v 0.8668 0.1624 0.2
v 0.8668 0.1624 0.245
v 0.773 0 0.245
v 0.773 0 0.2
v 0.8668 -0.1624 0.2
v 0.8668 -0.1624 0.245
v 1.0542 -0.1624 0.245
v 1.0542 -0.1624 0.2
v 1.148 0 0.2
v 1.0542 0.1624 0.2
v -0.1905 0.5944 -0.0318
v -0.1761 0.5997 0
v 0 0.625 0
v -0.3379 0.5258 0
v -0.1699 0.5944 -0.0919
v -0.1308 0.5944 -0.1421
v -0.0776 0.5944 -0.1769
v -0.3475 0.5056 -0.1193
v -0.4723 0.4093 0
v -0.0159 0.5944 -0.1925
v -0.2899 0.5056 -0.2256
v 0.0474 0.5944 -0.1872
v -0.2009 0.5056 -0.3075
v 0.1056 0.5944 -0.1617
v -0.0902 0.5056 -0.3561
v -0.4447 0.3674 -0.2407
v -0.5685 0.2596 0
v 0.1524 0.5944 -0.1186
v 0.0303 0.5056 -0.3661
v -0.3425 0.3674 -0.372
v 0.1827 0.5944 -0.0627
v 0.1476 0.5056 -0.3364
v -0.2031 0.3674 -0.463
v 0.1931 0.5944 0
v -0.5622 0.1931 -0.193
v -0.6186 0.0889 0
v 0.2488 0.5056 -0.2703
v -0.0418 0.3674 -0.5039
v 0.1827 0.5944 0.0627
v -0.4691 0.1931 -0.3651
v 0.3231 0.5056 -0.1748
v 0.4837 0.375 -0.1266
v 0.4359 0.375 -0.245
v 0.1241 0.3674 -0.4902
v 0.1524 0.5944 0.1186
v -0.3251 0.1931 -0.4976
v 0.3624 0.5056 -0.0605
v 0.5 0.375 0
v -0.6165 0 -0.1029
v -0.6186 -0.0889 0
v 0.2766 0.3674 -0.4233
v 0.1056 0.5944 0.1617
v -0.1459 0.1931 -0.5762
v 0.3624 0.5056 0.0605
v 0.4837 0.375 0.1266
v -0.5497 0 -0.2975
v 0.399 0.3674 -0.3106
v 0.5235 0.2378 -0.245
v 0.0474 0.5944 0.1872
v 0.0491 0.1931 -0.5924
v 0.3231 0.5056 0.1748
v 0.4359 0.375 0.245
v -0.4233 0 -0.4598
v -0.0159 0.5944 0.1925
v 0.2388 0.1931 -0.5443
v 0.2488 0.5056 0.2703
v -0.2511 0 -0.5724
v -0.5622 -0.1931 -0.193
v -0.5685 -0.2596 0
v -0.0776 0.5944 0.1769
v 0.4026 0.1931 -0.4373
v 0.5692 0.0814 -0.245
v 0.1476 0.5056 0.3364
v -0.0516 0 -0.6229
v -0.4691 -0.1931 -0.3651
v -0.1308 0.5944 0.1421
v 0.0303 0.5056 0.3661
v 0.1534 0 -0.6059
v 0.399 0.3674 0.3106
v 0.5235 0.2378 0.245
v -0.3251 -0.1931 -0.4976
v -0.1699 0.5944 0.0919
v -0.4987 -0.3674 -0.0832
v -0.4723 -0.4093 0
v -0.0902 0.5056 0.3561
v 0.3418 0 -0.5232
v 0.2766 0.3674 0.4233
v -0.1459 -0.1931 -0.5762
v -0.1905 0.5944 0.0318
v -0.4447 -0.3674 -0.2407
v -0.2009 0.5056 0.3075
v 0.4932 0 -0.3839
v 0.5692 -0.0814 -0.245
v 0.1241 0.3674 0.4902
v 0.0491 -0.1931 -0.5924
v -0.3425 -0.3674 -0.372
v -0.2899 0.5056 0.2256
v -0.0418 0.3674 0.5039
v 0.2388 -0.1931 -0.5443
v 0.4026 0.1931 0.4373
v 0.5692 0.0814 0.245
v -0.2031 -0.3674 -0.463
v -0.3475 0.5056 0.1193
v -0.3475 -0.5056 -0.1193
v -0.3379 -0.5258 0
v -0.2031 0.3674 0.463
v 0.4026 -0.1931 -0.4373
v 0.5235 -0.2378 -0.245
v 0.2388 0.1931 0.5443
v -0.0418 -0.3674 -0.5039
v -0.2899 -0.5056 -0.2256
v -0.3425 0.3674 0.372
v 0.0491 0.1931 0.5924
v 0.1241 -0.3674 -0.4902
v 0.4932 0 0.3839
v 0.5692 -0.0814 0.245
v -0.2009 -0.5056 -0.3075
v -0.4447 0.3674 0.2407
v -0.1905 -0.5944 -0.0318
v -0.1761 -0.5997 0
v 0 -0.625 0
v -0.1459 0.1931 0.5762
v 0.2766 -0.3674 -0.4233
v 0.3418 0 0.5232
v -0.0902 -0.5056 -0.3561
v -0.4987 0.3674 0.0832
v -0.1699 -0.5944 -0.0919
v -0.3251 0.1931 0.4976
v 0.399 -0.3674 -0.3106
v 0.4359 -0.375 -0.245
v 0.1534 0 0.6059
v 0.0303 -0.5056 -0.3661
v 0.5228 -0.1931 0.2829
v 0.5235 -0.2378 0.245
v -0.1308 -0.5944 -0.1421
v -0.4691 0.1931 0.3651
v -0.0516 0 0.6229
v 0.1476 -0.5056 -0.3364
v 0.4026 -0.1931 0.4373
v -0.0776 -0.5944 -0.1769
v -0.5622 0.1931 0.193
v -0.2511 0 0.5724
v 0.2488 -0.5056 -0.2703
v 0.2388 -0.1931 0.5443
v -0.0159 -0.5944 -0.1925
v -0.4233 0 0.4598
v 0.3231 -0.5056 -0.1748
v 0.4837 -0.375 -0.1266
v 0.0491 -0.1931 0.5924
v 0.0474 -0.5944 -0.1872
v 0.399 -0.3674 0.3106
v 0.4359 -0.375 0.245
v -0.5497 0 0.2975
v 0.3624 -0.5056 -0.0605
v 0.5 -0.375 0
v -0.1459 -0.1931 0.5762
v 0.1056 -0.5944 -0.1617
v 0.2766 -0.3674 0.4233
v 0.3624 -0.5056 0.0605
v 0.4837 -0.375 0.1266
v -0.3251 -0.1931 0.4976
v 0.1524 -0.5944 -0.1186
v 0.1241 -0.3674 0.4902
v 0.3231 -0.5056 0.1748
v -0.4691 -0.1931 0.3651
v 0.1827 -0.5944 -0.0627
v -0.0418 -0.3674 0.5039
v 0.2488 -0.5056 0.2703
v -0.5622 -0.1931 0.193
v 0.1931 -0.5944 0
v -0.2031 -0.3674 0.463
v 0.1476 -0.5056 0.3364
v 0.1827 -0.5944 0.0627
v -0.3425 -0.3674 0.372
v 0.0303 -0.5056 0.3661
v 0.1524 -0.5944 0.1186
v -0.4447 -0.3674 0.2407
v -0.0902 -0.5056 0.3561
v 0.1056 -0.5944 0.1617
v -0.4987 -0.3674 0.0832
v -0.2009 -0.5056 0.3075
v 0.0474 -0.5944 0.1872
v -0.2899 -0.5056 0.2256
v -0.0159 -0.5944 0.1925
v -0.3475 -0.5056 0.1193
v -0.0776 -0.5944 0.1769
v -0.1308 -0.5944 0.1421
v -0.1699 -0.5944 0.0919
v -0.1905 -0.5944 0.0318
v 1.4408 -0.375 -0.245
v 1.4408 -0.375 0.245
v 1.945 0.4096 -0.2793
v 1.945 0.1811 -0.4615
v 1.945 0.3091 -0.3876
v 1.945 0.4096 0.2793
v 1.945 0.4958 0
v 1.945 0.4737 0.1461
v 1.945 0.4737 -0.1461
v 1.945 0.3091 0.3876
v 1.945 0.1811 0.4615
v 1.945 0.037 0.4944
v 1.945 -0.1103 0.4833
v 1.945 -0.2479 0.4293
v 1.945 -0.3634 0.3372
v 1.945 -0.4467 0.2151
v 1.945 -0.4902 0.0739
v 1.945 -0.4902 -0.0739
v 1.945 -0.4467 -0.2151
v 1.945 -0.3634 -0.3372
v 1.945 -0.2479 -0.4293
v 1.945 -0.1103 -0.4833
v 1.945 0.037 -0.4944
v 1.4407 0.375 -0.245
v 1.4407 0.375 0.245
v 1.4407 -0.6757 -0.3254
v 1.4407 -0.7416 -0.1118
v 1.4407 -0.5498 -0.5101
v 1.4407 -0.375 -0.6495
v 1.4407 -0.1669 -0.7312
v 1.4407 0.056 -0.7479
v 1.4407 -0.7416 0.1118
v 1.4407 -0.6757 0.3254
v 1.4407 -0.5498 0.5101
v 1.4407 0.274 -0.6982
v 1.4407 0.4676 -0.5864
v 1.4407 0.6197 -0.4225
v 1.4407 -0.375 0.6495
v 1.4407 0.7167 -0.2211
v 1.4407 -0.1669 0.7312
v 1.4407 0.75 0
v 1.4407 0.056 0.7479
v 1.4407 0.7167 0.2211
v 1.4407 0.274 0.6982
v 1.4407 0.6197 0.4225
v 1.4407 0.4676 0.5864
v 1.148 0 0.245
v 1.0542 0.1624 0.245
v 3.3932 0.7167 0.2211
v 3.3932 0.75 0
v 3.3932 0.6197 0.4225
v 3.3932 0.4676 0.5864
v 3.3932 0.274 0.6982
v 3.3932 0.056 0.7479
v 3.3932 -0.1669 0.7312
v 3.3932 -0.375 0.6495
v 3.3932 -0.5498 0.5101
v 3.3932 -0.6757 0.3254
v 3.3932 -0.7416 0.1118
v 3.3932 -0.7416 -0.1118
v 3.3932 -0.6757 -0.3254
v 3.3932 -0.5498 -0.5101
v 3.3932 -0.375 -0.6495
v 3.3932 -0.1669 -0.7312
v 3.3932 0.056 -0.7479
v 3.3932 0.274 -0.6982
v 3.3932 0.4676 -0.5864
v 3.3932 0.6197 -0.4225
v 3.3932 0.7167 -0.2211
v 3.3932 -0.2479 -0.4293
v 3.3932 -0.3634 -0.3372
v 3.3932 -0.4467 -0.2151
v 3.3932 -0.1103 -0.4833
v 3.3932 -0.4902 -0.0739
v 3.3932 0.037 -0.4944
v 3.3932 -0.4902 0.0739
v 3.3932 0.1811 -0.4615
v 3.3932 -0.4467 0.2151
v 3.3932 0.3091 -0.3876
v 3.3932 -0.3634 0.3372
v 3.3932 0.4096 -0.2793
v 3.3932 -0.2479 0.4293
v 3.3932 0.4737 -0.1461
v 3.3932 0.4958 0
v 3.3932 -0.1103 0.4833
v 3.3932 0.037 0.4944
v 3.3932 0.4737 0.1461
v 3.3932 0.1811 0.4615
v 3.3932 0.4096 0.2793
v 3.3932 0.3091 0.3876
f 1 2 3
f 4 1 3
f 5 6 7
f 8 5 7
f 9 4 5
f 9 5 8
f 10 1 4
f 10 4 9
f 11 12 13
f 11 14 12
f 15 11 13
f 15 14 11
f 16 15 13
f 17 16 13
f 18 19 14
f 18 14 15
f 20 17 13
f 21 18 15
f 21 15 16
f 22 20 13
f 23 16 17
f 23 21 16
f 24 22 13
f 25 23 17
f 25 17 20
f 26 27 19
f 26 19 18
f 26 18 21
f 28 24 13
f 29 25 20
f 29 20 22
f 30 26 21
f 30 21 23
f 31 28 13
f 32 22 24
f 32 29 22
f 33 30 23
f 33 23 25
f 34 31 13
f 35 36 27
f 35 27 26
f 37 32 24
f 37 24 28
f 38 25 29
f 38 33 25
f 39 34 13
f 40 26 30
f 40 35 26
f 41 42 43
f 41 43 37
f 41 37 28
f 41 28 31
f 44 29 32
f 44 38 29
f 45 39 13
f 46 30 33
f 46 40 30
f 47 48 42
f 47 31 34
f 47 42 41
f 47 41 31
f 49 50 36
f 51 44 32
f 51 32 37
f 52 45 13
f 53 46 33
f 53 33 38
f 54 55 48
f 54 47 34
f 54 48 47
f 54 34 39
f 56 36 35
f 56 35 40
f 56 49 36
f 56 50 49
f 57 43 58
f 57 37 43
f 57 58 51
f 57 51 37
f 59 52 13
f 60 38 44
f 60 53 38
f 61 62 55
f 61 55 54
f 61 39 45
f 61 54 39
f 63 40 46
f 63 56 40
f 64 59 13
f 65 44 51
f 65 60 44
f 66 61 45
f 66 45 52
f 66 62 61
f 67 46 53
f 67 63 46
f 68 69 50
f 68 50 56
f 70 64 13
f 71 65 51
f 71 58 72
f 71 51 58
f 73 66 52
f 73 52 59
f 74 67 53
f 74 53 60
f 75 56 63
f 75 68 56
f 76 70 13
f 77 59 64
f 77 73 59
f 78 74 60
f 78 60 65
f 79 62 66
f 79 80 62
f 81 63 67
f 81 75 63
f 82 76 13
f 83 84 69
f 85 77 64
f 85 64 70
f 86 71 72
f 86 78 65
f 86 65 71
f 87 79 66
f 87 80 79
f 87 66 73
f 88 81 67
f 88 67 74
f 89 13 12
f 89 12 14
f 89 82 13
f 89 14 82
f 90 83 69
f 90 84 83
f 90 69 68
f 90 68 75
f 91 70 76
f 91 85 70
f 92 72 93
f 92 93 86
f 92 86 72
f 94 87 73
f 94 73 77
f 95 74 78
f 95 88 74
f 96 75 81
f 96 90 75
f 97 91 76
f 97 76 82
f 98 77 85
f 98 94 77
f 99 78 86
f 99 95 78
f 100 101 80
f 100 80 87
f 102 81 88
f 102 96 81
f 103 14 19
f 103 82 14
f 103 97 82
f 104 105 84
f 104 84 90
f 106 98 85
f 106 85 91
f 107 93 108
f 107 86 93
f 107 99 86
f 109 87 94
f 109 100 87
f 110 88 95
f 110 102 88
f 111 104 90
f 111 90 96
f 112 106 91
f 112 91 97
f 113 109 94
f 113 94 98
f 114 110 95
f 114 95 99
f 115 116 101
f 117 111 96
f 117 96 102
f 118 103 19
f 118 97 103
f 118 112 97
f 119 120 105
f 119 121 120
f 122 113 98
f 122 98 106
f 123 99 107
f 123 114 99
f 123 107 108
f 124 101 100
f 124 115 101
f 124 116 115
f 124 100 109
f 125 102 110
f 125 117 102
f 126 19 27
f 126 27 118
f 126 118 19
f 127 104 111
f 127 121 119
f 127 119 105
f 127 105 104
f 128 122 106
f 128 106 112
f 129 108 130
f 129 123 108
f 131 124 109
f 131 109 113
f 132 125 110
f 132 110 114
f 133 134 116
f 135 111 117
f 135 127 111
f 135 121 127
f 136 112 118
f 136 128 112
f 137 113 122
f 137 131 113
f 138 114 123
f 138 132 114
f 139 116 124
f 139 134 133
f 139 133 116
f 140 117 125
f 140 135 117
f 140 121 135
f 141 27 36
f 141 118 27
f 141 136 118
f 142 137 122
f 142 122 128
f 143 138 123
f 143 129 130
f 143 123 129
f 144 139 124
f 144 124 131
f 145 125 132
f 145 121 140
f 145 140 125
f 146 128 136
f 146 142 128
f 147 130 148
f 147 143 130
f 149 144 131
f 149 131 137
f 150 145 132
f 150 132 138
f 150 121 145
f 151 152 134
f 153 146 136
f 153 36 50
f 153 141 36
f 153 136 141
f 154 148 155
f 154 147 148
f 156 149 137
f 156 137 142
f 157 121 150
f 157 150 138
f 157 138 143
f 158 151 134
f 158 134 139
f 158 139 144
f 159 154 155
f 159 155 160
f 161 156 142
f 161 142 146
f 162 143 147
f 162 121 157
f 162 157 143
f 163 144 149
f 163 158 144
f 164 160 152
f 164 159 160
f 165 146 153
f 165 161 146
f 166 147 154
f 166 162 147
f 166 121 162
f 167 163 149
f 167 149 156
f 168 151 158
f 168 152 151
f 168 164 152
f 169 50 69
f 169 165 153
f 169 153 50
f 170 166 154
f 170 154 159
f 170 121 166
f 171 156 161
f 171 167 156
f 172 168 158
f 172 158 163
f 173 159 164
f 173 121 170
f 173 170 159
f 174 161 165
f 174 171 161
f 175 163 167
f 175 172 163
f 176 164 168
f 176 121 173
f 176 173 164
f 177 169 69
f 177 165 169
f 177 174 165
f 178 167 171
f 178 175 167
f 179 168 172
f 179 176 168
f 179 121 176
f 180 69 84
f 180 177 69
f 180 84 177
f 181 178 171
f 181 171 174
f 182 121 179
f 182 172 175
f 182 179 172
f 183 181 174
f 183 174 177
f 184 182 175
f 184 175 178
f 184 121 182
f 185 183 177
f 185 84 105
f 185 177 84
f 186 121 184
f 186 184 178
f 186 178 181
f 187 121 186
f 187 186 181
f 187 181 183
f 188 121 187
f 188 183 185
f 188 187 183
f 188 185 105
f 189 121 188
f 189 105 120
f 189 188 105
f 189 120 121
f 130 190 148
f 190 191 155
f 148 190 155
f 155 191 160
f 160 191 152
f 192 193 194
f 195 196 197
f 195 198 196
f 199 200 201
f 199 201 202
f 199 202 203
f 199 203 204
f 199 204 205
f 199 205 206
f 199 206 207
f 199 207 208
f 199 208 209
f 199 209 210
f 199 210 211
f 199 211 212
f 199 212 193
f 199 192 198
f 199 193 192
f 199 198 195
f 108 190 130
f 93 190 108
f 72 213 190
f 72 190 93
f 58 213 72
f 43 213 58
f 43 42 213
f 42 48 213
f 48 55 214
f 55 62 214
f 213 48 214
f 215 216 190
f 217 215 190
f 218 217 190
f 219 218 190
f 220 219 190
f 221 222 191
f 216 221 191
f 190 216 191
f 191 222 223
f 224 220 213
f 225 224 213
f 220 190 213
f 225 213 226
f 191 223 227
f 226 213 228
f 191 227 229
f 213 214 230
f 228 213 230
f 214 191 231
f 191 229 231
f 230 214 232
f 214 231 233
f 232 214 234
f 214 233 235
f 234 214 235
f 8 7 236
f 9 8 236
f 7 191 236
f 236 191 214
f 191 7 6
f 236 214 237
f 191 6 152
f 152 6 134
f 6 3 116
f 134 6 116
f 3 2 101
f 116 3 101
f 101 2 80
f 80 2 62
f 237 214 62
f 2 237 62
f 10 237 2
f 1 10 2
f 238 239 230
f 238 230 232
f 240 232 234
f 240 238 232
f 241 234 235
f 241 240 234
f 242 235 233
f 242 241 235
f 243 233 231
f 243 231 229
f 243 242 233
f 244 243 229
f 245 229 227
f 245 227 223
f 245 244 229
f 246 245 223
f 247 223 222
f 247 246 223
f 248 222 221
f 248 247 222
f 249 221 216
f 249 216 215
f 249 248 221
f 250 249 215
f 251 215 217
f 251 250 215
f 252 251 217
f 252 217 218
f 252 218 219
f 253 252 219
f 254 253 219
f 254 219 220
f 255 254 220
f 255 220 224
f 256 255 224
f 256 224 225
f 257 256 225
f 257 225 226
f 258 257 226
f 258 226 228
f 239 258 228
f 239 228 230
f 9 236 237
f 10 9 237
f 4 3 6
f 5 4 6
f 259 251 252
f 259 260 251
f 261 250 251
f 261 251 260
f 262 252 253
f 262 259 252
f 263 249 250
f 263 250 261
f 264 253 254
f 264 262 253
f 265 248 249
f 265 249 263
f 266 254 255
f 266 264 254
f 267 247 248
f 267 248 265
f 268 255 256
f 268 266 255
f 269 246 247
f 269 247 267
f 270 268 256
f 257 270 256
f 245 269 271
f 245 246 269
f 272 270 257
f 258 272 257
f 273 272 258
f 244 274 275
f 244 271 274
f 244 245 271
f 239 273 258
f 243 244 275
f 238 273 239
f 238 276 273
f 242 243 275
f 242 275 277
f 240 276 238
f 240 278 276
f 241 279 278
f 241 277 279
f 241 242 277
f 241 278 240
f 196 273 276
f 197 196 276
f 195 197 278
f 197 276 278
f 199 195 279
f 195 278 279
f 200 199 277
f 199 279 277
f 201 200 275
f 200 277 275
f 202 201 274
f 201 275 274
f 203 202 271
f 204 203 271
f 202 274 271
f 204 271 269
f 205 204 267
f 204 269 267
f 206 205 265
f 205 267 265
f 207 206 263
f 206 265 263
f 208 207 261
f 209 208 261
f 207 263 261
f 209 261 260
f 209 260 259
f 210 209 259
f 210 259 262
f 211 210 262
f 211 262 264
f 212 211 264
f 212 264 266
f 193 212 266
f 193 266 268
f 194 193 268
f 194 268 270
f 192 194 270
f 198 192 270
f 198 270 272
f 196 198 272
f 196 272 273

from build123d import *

# Parameters (mm, degrees)
PAD_DEPTH       = 0.245
POCKET_DEPTH    = 0.05
SKETCH004_R     = 0.75
PAD001_DEPTH    = 10.08525
SKETCH005_R     = 3
HOLE_DEPTH      = 26
SKETCH006_R     = 0.495763
POCKET001_DEPTH = 9.580987
SKETCH007_W     = 15
SKETCH007_H     = 15
POCKET002_DEPTH = 8.1338


with BuildPart() as part:
    # Sketch → Pad (new body, symmetric)
    with BuildSketch(Plane.XY):
        with BuildLine():
            Line((0, 0.375), (19.21, 0.375))
            ThreePointArc((19.21, -0.375), (19.585, 0), (19.21, 0.375))
            Line((19.21, -0.375), (0, -0.375))
            ThreePointArc((0, 0.375), (-0.375, 0), (0, -0.375))
        make_face()
    extrude(amount=PAD_DEPTH, both=True)

    # Sketch001 → Revolution (revolve)
    with BuildSketch(Plane.XY):
        with BuildLine():
            Line((0, 0.625), (0, 0))
            Line((0, 0), (0, -0.625))
            ThreePointArc((0, 0.625), (-0.625, 0), (0, -0.625))
        make_face()
    revolve(axis=Axis((0, 0, 0), (0, -1, 0)))

    # Sketch002 → Revolution001 (revolve)
    with BuildSketch(Plane.XY):
        with BuildLine():
            ThreePointArc((19.21, -0.625), (19.835, 0), (19.21, 0.625))
            Line((19.21, 0.625), (19.21, 0))
            Line((19.21, 0), (19.21, -0.625))
        make_face()
    revolve(axis=Axis((19.21, 0, 0), (0, -1, 0)))

    # Sketch003 (on DatumPlane) → Pocket (cut)
    with BuildSketch(Plane.XY.offset(0.25)):
        Polygon((1.05425, -0.16238), (1.148, 0), (1.05425, 0.16238), (0.86675, 0.16238), (0.773, 0), (0.86675, -0.16238), align=None)
    extrude(amount=-POCKET_DEPTH, mode=Mode.SUBTRACT)

    # Sketch004 (on DatumPlane) → Pad001 (join)
    with BuildSketch(Plane.YZ.offset(11.526)):
        Circle(SKETCH004_R)
    extrude(amount=-PAD001_DEPTH)

    # Sketch005 (on DatumPlane) → Hole (cut)
    with BuildSketch(Plane.YZ.offset(11.526)):
        Circle(SKETCH005_R)
    extrude(amount=HOLE_DEPTH, mode=Mode.SUBTRACT)

    # Sketch006 (on DatumPlane) → Pocket001 (cut)
    with BuildSketch(Plane.YZ.offset(11.526)):
        Circle(SKETCH006_R)
    extrude(amount=-POCKET001_DEPTH, mode=Mode.SUBTRACT)

    # Sketch007 (on DatumPlane) → Pocket002 (cut, through all)
    with BuildSketch(Plane.YZ.offset(3.3932)):
        Rectangle(SKETCH007_W, SKETCH007_H)
    extrude(amount=POCKET002_DEPTH, mode=Mode.SUBTRACT)


solid = part.part
